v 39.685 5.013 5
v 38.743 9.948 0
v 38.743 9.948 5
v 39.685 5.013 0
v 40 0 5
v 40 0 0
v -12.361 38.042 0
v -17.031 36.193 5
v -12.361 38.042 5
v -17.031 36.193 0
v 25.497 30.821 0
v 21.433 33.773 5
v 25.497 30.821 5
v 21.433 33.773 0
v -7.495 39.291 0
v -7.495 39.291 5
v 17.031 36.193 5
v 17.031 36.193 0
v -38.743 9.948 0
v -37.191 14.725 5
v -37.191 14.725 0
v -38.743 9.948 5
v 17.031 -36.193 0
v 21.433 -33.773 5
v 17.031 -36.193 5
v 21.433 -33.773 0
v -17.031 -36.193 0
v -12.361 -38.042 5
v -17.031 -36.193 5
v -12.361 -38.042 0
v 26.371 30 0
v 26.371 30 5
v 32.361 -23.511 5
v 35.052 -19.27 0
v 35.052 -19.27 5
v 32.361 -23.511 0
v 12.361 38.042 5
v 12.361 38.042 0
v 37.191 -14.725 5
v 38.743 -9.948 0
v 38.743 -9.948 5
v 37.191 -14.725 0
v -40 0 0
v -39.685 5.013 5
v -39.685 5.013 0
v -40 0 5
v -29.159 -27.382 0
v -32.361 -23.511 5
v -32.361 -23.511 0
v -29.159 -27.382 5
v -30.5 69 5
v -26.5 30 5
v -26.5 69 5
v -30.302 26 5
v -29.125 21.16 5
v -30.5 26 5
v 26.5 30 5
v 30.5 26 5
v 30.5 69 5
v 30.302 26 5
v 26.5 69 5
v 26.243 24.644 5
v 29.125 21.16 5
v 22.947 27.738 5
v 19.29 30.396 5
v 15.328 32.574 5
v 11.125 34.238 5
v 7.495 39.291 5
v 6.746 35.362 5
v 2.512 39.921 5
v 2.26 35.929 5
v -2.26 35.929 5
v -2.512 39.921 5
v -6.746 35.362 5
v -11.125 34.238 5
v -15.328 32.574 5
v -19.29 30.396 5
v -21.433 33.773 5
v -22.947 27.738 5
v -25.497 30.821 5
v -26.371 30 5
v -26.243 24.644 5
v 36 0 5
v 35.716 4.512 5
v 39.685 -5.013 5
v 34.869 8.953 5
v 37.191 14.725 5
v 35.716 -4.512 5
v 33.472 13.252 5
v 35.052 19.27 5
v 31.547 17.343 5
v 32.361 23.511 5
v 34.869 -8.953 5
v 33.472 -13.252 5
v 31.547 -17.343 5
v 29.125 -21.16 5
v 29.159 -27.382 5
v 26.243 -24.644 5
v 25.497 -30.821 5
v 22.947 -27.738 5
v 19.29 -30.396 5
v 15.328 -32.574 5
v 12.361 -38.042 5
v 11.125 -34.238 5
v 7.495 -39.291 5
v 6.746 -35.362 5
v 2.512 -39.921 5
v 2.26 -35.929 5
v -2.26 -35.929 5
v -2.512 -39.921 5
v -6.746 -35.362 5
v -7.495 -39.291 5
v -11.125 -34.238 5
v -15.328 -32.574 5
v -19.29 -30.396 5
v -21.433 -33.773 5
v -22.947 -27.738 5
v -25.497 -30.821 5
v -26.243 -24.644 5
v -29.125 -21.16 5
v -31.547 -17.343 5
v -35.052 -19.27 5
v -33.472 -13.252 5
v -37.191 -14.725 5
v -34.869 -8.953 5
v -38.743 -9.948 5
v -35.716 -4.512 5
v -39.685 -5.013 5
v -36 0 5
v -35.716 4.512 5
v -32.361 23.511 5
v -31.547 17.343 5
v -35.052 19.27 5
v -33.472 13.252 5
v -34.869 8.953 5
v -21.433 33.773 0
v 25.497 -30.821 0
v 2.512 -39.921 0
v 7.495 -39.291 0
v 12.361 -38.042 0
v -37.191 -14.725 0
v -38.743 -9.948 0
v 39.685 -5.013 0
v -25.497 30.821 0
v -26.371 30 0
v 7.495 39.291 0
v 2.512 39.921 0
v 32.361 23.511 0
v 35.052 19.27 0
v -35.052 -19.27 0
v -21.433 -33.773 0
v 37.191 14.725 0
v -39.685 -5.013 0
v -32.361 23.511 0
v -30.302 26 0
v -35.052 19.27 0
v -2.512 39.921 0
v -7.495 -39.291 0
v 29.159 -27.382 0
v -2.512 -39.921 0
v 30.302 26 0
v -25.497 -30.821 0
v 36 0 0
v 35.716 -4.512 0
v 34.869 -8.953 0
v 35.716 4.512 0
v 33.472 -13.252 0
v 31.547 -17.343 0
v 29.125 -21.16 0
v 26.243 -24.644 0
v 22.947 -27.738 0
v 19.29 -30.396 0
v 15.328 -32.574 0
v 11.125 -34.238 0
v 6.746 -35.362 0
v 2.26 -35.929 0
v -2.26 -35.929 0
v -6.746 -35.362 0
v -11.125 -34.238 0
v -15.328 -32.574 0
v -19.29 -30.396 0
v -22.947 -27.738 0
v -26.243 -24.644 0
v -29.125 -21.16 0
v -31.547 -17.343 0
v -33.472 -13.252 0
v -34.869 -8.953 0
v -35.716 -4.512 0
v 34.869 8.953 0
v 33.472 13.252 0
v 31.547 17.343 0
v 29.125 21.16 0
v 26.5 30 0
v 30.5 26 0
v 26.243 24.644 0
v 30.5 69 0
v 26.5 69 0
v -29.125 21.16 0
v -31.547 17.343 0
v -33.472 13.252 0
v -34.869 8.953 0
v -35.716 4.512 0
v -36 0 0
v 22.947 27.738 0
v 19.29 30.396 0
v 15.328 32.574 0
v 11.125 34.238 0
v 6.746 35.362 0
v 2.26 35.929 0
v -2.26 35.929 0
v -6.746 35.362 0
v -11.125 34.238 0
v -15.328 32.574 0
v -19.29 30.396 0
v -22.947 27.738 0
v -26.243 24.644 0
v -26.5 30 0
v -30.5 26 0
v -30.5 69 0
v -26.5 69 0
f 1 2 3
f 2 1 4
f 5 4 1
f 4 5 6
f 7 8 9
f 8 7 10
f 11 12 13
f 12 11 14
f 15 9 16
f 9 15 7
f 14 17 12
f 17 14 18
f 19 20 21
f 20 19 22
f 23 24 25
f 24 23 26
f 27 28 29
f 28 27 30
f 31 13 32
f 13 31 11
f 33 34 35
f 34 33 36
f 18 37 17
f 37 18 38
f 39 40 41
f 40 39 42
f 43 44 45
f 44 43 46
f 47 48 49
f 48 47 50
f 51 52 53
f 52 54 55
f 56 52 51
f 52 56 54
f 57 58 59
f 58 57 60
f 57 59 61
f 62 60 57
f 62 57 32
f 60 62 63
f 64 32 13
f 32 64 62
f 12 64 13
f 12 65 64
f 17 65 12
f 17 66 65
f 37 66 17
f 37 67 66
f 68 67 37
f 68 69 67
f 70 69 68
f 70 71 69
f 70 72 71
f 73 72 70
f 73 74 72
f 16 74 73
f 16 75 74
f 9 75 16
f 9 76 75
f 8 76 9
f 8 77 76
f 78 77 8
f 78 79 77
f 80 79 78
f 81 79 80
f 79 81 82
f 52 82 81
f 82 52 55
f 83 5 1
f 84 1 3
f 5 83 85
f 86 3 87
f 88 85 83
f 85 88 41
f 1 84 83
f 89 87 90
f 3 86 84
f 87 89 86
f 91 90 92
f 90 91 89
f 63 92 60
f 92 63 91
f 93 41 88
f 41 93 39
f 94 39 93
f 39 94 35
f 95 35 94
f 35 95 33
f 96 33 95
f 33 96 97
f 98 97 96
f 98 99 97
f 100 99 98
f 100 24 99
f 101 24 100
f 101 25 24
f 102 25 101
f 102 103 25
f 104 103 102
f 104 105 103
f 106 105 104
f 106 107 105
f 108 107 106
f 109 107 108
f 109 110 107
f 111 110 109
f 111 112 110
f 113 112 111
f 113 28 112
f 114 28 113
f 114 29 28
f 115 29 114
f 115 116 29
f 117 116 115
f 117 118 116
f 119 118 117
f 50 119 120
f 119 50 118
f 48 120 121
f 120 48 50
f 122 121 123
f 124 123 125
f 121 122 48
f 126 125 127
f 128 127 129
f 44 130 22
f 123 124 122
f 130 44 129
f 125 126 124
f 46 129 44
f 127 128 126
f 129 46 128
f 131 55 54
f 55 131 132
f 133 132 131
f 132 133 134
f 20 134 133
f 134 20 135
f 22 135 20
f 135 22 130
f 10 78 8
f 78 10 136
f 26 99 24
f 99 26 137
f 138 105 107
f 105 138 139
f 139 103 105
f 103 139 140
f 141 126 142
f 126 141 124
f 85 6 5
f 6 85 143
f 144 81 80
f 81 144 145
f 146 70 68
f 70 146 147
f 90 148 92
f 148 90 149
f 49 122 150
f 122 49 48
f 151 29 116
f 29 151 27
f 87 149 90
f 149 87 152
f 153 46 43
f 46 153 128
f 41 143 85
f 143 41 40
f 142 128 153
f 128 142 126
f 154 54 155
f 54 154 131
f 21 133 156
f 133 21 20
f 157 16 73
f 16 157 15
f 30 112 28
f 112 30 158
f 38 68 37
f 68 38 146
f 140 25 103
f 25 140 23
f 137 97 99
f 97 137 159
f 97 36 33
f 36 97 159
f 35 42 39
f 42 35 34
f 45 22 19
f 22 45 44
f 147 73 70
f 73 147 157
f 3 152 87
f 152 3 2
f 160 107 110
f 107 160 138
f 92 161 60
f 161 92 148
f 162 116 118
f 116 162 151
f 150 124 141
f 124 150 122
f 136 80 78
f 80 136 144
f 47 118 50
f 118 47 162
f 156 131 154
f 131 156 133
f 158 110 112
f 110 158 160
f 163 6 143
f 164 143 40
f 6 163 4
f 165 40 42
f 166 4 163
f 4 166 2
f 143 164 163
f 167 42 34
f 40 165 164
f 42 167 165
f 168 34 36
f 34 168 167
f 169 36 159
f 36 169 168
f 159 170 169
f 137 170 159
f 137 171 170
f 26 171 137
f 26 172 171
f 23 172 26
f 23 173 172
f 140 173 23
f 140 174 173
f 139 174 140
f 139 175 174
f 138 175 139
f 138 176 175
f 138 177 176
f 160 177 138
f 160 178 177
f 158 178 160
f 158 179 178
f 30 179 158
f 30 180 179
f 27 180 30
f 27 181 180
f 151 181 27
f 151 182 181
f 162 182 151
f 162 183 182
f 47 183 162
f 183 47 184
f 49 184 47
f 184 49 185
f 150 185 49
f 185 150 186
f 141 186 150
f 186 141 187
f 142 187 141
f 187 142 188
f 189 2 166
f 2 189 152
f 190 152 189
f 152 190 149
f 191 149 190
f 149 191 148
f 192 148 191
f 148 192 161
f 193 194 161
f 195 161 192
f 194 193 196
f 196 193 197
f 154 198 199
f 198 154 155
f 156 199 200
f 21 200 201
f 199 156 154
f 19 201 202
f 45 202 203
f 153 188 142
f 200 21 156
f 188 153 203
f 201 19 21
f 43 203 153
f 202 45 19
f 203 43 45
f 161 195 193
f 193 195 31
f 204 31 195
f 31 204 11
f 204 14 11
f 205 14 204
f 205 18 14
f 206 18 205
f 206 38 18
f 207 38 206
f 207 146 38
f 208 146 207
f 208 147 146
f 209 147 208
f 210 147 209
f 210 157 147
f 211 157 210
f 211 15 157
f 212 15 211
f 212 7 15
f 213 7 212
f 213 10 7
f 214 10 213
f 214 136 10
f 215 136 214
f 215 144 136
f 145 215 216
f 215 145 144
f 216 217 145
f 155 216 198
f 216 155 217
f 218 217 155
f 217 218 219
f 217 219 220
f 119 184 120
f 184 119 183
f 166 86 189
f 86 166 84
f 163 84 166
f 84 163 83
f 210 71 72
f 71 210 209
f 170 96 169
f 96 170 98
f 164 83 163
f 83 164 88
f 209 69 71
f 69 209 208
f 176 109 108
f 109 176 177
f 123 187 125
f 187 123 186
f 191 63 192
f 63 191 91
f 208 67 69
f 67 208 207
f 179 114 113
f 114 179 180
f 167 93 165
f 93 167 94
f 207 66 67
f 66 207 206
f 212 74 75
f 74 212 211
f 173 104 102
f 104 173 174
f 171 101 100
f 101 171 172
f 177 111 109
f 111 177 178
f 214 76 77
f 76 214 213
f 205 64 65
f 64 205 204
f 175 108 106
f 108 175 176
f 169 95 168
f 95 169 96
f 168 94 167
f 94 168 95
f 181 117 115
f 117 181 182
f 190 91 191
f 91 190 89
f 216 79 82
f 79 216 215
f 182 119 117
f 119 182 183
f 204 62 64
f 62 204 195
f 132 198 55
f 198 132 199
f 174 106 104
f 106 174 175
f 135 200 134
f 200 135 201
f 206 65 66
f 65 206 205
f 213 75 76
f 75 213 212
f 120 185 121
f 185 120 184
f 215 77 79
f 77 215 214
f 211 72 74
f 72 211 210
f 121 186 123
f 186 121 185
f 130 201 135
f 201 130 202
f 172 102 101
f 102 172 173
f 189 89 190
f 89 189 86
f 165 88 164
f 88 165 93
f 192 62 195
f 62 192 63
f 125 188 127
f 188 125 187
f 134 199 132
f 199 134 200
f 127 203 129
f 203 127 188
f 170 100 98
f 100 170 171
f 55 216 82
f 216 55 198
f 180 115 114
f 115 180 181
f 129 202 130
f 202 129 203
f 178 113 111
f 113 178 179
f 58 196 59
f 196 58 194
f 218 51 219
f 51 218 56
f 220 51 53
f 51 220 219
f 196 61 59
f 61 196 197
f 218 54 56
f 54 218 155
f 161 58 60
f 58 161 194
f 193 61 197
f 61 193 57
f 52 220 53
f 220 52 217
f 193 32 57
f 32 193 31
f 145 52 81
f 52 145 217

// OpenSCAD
$fn=50;
e=0.1;

bottle_radius = 36;
lid_width = 53;
lid_depth = 35;

height = 5;
thickness = 4;
thickness_lid = thickness * 2;

difference() {
    cylinder(height, r=bottle_radius+thickness, true); 
    
    cylinder(height + e, r=bottle_radius, true);
}

difference() {
    translate([-((lid_width + thickness_lid)/2), bottle_radius-10, 0])
    {
        difference() {
            cube([lid_width + thickness_lid, lid_depth + thickness_lid, height]);
            
            translate([thickness_lid / 2, thickness_lid / 2, 0])
                cube([lid_width, lid_depth + thickness_lid / 2 + e, height + e]);
        }
    }

    cylinder(height, r=bottle_radius+thickness, true);
    
}
